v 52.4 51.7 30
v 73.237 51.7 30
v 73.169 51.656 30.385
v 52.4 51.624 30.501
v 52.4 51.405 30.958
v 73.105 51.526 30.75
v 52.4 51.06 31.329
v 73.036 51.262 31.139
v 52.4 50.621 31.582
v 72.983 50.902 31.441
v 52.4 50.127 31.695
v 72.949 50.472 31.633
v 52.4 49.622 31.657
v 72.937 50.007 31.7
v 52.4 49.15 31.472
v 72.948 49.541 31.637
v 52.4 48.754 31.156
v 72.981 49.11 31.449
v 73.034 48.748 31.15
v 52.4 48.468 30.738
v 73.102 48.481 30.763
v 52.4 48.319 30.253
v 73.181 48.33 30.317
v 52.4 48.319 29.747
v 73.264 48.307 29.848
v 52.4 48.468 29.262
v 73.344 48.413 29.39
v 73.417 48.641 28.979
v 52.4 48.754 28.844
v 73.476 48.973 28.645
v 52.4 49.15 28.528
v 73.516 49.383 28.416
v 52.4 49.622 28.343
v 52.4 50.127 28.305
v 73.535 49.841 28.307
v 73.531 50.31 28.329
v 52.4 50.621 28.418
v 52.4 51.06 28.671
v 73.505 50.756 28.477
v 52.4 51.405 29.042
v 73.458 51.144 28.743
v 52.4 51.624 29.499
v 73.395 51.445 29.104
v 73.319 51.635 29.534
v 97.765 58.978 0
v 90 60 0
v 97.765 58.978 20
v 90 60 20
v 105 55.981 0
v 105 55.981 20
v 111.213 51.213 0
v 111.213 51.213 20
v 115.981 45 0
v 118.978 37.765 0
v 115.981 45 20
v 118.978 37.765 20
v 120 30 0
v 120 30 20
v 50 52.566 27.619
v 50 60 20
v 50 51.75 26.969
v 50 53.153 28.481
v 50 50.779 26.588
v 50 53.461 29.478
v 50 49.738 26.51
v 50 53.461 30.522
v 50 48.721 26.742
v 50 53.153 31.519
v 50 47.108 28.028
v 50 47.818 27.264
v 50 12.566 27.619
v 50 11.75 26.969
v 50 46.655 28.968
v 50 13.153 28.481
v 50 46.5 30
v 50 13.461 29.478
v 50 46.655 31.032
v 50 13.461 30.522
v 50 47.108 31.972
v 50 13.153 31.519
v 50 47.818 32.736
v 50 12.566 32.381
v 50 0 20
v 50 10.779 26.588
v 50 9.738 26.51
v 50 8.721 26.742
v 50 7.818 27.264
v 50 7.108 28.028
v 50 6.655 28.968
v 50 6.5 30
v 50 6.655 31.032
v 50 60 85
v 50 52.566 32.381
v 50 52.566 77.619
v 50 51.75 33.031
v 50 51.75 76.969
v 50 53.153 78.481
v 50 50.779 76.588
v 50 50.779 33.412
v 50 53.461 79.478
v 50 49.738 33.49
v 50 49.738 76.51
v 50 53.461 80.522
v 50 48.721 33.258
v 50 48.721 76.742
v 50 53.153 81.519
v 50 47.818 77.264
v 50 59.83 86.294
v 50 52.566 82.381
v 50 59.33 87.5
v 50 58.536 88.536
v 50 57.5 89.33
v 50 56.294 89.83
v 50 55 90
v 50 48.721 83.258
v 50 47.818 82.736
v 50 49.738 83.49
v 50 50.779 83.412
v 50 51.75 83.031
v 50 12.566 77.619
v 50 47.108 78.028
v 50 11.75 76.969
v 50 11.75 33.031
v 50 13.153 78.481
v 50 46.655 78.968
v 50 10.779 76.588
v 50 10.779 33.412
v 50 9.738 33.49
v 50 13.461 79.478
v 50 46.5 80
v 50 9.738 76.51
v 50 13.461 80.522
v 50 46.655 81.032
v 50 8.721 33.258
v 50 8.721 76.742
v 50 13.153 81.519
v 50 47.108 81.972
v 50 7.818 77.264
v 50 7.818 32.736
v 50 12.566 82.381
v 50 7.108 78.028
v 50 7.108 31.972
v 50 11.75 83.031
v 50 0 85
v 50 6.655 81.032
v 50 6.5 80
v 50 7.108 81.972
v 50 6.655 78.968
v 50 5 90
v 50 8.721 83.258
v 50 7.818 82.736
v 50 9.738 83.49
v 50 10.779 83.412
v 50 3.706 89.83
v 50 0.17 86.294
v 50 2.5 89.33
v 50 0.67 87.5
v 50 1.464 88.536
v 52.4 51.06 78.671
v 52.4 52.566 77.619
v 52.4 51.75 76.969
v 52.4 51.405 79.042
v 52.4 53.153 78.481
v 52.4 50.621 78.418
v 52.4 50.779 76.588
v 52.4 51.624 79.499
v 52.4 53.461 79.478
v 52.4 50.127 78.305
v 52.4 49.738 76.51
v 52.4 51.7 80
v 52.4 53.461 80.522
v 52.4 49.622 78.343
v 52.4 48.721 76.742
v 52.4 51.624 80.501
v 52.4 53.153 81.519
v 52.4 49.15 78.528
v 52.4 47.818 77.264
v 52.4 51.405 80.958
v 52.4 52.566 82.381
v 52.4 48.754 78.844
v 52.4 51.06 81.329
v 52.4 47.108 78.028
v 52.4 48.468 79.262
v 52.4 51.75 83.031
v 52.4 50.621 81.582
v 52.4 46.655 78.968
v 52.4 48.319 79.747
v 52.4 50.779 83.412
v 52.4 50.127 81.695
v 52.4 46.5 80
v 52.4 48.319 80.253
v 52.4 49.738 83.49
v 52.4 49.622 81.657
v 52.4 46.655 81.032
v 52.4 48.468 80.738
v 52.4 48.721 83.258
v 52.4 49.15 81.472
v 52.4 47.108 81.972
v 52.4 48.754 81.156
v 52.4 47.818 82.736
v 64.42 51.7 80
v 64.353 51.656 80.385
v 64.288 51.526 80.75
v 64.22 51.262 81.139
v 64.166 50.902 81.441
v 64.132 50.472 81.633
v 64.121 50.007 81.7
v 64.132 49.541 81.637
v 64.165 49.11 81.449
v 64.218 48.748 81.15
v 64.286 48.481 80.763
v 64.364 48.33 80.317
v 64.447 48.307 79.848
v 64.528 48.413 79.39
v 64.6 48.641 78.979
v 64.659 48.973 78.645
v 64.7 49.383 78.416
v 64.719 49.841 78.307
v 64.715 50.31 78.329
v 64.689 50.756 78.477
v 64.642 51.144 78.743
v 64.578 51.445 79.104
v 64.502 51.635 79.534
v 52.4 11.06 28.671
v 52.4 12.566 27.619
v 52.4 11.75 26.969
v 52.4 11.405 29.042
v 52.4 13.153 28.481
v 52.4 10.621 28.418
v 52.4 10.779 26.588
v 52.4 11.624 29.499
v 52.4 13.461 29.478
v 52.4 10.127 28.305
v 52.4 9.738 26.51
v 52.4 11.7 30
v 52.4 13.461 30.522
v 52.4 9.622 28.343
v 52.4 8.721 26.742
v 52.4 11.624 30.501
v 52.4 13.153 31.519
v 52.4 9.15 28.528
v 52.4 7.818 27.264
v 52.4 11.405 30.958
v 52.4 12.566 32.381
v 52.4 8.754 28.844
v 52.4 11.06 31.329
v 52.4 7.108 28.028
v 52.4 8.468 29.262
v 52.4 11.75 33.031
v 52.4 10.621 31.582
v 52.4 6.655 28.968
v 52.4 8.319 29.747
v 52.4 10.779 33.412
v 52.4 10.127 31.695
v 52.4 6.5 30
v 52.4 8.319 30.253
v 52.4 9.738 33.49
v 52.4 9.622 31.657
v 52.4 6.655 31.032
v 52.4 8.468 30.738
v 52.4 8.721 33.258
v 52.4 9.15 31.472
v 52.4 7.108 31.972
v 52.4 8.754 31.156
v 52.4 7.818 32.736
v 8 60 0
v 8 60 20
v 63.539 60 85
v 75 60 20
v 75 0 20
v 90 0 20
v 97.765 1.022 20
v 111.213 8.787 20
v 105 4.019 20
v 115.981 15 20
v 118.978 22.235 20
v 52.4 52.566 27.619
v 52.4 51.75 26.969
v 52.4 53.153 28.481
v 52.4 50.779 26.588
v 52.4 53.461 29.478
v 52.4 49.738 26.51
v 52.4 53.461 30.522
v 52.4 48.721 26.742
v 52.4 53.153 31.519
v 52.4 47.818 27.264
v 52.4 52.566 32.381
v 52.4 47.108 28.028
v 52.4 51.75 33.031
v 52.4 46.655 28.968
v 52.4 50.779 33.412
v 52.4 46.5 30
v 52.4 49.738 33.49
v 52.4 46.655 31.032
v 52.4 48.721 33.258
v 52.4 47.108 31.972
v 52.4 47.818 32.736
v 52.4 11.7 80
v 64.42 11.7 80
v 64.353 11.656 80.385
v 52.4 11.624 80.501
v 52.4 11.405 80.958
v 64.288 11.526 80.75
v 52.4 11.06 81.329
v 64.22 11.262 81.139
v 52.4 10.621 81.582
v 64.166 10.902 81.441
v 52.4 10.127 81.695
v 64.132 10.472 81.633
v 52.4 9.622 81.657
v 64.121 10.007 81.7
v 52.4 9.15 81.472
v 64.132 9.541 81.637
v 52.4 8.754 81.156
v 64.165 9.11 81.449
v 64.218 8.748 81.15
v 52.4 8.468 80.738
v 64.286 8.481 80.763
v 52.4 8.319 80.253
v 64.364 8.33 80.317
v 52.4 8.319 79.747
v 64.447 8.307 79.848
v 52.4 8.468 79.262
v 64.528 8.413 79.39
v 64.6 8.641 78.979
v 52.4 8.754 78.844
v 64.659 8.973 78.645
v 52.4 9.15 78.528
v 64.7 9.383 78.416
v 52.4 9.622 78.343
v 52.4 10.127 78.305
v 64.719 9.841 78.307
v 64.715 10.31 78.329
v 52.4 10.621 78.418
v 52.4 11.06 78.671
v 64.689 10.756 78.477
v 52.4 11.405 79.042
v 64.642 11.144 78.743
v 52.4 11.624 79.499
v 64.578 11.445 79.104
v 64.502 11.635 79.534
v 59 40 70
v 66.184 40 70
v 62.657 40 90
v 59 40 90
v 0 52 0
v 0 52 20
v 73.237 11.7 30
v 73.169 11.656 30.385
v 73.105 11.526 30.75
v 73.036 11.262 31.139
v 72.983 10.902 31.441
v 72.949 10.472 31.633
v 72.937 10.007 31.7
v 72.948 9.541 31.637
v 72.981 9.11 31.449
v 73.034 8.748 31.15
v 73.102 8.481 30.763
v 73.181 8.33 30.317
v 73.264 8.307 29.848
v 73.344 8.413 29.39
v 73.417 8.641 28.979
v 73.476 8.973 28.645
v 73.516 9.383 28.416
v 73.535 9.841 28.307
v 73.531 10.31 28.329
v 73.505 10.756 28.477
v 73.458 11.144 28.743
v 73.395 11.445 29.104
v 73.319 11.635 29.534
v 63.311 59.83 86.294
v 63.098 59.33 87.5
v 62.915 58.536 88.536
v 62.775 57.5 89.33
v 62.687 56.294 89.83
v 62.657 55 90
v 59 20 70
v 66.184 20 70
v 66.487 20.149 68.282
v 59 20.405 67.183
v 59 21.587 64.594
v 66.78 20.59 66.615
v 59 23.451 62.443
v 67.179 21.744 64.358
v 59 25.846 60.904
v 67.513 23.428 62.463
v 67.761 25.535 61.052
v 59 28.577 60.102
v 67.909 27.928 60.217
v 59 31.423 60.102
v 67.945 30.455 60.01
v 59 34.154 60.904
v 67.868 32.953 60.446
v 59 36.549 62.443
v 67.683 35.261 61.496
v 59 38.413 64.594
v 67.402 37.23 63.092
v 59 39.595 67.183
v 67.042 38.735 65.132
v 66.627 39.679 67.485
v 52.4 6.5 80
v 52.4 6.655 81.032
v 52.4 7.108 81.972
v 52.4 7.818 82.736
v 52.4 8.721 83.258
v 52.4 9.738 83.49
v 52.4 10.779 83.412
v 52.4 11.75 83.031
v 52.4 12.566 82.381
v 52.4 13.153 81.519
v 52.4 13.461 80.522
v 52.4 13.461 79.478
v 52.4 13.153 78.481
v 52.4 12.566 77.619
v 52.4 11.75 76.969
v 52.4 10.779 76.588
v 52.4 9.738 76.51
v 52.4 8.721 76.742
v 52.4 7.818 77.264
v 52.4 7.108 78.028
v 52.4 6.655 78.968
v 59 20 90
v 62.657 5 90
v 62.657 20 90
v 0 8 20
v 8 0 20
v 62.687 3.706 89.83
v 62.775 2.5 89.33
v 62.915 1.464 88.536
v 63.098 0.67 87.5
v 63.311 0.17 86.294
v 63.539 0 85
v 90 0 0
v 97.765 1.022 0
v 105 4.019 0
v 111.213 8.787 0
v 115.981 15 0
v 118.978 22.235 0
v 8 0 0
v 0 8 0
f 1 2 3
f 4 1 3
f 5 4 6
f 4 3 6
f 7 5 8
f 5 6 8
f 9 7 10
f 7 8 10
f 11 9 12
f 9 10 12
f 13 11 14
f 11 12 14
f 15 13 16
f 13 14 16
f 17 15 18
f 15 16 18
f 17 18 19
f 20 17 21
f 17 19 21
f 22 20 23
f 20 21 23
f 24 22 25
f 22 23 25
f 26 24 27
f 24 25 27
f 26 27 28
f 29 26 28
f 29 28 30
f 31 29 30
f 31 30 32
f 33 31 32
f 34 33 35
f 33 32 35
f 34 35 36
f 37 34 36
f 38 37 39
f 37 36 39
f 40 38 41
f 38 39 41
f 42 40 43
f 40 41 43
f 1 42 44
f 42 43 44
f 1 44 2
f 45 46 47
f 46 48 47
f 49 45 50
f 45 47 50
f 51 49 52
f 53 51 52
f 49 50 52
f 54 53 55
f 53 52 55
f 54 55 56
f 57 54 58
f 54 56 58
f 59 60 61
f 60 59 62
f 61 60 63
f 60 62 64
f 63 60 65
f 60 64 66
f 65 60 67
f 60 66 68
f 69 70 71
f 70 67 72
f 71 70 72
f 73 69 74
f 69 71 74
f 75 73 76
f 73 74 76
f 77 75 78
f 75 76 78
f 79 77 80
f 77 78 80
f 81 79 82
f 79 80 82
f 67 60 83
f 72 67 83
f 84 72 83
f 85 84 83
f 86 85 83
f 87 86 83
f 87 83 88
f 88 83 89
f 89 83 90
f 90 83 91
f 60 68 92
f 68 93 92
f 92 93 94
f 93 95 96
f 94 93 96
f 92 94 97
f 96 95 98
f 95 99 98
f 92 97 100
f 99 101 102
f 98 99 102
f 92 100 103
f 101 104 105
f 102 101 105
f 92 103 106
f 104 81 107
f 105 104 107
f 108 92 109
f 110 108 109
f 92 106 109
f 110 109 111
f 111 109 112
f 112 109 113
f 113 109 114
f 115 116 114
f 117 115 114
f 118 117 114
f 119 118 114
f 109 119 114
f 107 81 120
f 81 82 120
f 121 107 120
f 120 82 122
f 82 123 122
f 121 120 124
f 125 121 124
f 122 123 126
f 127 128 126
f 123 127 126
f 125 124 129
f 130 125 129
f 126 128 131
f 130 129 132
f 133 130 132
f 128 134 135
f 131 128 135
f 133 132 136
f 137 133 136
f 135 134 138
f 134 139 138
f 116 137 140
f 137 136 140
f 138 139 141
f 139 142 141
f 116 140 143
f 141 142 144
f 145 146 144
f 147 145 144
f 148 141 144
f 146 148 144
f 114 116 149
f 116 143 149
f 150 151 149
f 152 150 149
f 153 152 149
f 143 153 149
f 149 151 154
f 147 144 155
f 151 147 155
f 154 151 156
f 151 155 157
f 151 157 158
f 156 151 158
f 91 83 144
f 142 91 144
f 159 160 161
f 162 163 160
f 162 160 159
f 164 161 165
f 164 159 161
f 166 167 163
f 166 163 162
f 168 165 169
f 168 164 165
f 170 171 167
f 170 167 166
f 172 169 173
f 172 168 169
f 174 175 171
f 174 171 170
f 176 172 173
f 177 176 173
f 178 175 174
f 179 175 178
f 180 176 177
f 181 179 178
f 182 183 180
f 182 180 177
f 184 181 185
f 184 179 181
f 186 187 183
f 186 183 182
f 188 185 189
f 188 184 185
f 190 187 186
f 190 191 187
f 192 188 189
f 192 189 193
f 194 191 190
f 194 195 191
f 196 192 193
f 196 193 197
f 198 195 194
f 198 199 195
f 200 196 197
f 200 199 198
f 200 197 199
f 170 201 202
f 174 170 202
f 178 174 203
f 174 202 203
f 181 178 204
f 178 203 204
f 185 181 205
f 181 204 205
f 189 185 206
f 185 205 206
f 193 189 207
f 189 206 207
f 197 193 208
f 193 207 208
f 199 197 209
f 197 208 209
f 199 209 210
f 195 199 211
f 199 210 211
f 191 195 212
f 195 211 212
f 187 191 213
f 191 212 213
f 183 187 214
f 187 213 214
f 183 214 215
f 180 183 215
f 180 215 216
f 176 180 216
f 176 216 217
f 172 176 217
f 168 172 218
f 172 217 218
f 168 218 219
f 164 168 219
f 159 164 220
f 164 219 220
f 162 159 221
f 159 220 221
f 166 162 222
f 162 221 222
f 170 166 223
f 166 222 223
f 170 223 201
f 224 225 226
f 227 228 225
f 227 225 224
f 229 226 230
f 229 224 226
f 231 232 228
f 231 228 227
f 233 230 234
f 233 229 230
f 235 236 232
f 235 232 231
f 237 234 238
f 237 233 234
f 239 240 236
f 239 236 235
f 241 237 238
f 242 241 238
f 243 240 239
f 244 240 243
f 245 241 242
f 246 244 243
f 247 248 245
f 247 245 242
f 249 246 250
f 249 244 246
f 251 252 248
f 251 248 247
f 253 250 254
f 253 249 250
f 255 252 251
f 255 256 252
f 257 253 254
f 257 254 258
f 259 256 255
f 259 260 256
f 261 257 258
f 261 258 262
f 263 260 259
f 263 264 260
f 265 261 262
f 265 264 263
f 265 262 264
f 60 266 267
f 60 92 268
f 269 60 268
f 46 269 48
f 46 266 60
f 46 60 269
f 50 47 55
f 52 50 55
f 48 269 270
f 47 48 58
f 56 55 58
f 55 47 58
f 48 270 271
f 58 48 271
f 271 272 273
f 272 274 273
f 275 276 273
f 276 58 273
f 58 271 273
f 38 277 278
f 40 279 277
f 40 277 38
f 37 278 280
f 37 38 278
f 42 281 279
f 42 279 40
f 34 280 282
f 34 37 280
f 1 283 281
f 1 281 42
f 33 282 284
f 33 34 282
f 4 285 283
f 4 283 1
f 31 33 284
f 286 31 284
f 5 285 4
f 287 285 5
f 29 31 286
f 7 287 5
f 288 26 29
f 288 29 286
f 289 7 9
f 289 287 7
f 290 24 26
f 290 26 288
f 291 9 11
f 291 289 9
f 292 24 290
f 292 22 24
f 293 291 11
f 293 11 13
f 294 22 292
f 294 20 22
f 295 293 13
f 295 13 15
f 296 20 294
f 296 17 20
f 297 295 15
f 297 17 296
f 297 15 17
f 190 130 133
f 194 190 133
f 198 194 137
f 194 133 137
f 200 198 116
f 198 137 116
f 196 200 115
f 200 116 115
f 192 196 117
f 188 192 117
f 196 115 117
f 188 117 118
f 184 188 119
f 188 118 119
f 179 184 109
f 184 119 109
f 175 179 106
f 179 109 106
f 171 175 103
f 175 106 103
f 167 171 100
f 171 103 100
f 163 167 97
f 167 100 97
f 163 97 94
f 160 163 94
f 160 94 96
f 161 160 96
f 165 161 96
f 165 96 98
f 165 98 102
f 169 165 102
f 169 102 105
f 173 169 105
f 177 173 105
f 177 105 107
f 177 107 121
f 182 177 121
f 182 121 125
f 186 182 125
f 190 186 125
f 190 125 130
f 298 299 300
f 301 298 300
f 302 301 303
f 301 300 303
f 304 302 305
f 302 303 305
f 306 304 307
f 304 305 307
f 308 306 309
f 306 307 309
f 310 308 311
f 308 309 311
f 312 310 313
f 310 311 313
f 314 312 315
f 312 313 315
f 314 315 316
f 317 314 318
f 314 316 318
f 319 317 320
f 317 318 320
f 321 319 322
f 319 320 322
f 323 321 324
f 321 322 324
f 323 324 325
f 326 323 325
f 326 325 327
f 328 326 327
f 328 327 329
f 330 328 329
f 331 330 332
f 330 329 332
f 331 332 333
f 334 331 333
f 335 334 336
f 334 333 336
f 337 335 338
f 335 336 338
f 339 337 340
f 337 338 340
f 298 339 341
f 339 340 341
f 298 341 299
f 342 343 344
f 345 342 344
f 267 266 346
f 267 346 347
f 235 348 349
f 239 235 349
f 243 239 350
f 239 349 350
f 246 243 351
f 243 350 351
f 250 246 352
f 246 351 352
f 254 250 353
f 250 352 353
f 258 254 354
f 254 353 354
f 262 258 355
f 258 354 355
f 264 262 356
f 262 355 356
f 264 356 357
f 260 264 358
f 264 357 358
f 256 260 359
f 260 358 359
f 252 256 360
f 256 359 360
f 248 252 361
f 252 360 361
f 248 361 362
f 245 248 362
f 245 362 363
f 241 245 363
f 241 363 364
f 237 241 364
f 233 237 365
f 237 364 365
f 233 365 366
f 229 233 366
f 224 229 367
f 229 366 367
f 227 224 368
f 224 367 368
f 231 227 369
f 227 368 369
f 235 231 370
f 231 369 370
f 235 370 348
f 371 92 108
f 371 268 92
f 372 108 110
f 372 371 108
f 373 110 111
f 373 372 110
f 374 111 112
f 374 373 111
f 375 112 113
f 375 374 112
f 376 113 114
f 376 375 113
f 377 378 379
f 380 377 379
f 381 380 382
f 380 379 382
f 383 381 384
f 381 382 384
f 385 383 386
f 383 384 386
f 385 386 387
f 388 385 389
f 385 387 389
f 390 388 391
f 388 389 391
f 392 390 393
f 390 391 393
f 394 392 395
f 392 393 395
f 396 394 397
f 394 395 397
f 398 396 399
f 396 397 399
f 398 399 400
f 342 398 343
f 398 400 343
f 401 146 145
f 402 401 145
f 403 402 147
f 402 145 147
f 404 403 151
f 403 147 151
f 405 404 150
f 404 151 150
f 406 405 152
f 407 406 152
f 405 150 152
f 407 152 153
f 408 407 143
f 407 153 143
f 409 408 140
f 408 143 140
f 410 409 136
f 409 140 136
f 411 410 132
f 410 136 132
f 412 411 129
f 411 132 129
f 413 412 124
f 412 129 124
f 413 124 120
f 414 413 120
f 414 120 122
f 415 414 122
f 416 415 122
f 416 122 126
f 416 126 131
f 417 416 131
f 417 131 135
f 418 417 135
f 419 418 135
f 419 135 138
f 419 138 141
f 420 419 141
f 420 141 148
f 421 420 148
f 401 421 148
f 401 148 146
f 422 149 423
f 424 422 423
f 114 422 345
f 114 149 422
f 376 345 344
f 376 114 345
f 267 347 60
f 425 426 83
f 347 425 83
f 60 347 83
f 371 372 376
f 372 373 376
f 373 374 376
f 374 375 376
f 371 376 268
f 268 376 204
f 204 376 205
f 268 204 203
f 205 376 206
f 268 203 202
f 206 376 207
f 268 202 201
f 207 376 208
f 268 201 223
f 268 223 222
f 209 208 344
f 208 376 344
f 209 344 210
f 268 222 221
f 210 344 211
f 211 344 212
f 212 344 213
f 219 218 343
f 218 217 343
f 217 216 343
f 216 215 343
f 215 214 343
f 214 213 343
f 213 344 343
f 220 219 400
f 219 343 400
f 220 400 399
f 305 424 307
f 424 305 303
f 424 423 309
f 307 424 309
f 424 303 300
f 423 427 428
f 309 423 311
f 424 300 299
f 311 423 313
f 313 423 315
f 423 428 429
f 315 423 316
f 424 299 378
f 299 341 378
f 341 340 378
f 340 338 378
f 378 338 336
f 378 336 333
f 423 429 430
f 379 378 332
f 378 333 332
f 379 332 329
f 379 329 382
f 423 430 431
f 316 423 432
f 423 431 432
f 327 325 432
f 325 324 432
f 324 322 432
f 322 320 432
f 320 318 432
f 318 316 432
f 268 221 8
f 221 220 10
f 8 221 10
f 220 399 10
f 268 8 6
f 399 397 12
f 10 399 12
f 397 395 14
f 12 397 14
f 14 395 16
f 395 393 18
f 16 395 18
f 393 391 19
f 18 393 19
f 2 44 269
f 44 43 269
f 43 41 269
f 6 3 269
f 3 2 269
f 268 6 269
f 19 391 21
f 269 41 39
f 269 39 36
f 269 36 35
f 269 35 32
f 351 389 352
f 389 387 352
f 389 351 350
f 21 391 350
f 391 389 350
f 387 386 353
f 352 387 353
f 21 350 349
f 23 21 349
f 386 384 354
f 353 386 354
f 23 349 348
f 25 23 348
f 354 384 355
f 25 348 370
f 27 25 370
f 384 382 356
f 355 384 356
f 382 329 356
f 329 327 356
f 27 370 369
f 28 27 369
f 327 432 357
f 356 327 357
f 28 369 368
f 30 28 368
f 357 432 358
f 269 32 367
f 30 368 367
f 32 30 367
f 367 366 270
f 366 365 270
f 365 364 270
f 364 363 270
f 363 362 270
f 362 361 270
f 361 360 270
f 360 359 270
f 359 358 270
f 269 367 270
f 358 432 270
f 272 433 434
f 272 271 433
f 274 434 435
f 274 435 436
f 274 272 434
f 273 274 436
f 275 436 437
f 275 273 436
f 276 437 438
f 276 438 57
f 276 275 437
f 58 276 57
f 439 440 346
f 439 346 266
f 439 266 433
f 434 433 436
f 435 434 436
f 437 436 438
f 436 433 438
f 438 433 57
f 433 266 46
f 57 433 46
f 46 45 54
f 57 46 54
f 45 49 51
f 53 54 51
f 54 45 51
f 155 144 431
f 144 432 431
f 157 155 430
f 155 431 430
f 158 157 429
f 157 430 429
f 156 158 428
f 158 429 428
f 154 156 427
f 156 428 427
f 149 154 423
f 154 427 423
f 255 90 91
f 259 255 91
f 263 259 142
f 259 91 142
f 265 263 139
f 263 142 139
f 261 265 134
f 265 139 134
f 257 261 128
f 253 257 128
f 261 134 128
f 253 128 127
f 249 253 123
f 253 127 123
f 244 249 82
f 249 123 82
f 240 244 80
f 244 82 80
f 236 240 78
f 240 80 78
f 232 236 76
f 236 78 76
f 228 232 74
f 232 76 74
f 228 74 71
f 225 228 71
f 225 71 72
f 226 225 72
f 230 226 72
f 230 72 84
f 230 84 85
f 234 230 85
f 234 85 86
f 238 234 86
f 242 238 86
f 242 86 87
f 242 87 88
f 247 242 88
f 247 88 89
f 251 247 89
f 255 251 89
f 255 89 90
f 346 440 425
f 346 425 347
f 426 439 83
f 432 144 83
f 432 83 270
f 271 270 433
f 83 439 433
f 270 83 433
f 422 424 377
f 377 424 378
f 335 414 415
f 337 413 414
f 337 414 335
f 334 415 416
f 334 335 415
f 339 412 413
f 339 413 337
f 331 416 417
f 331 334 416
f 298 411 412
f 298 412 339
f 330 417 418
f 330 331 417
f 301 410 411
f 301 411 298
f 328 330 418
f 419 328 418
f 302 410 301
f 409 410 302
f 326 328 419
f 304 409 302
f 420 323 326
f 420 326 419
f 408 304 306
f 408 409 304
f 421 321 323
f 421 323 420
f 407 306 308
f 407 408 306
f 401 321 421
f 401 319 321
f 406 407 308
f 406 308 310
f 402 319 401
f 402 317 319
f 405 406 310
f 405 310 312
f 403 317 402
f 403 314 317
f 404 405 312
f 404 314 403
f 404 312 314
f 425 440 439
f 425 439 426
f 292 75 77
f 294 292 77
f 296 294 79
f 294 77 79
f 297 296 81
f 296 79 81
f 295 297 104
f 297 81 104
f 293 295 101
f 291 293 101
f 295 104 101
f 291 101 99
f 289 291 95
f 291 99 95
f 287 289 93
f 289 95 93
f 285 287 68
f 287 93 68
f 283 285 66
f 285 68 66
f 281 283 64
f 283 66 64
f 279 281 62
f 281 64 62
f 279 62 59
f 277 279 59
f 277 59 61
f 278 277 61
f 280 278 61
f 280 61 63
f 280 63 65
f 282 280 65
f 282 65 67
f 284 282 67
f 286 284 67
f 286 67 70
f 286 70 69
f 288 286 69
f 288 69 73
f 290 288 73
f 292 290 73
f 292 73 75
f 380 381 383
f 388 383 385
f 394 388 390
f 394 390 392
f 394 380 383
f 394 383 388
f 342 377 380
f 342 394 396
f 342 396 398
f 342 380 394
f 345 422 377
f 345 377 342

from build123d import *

# Parameters (mm, degrees)
F0_W           = 120
F0_H           = 60
F1_DEPTH       = 90
F2_W           = 50
F2_H           = 70
F2_W_2         = 45
F3_DEPTH       = 60.001
F4_R           = 29.99999
F5_SIZE        = 8
F7_D           = 3.4
F7_CBORE_D     = 7
F7_CBORE_DEPTH = 2.4
F9_DEPTH       = 16
F11_DEPTH      = 60.001
F12_R          = 5


# Not quite as in the source:
# - a fillet or chamfer is up to 0.001 mm smaller than in the source, because OpenCascade refuses the exact size


with BuildPart() as f1:
    # F0 (on Top) → F1 (new body)
    with BuildSketch(Plane.XY):
        with Locations((60, 30)):
            Rectangle(F0_W, F0_H)
    extrude(amount=F1_DEPTH)

    # F2 (on face) → F3 (cut, through all)
    with BuildSketch(Plane.XZ):
        with Locations((25, 55)):
            Rectangle(F2_W, F2_H)
        with Locations((97.5, 55)):
            Rectangle(F2_W_2, F2_H)
    extrude(amount=-F3_DEPTH, mode=Mode.SUBTRACT)

    # F4 (radius 30 in the source; OpenCascade refuses exactly that, so slightly less here)
    f4_edges = [f1.edges().sort_by_distance(p)[0] for p in [
        (120, 60, 10),
        (120, 0, 10),
    ]]
    fillet(f4_edges, radius=F4_R)

    # F5
    f5_edges = [f1.edges().sort_by_distance(p)[0] for p in [
        (0, 60, 10),
        (0, 0, 10),
    ]]
    chamfer(f5_edges, length=F5_SIZE)

    # F7 (through all)
    with Locations(Plane(origin=(50, 0, 0), x_dir=(0, -1, 0), z_dir=(-1, 0, 0))):
        with Locations((-50, 80), (-10, 80), (-10, 30), (-50, 30)):
            CounterBoreHole(F7_D / 2, F7_CBORE_D / 2, F7_CBORE_DEPTH)

    # F8 (on face) → F9 (cut)
    with BuildSketch(Plane.YZ.offset(75)):
        with BuildLine():
            Line((40, 90), (20, 90))
            Line((20, 90), (20, 70))
            ThreePointArc((20, 70), (30, 80), (40, 70))
            Line((40, 70), (40, 90))
        make_face()
        with BuildLine():
            ThreePointArc((40, 70), (30, 80), (20, 70))
            Line((20, 70), (40, 70))
        make_face()
        with BuildLine():
            Line((40, 70), (20, 70))
            ThreePointArc((20, 70), (30, 60), (40, 70))
        make_face()
    extrude(amount=-F9_DEPTH, mode=Mode.SUBTRACT)

    # F10 (on face) → F11 (cut, through all)
    with BuildSketch(Plane.XZ):
        Polygon((62.6571113504, 90), (75, 20), (75, 90), align=None)
    extrude(amount=-F11_DEPTH, mode=Mode.SUBTRACT)

    # F12
    f12_edges = [f1.edges().sort_by_distance(p)[0] for p in [
        (56.328556, 60, 90),
        (56.328556, 0, 90),
    ]]
    fillet(f12_edges, radius=F12_R)


solid = f1.part
